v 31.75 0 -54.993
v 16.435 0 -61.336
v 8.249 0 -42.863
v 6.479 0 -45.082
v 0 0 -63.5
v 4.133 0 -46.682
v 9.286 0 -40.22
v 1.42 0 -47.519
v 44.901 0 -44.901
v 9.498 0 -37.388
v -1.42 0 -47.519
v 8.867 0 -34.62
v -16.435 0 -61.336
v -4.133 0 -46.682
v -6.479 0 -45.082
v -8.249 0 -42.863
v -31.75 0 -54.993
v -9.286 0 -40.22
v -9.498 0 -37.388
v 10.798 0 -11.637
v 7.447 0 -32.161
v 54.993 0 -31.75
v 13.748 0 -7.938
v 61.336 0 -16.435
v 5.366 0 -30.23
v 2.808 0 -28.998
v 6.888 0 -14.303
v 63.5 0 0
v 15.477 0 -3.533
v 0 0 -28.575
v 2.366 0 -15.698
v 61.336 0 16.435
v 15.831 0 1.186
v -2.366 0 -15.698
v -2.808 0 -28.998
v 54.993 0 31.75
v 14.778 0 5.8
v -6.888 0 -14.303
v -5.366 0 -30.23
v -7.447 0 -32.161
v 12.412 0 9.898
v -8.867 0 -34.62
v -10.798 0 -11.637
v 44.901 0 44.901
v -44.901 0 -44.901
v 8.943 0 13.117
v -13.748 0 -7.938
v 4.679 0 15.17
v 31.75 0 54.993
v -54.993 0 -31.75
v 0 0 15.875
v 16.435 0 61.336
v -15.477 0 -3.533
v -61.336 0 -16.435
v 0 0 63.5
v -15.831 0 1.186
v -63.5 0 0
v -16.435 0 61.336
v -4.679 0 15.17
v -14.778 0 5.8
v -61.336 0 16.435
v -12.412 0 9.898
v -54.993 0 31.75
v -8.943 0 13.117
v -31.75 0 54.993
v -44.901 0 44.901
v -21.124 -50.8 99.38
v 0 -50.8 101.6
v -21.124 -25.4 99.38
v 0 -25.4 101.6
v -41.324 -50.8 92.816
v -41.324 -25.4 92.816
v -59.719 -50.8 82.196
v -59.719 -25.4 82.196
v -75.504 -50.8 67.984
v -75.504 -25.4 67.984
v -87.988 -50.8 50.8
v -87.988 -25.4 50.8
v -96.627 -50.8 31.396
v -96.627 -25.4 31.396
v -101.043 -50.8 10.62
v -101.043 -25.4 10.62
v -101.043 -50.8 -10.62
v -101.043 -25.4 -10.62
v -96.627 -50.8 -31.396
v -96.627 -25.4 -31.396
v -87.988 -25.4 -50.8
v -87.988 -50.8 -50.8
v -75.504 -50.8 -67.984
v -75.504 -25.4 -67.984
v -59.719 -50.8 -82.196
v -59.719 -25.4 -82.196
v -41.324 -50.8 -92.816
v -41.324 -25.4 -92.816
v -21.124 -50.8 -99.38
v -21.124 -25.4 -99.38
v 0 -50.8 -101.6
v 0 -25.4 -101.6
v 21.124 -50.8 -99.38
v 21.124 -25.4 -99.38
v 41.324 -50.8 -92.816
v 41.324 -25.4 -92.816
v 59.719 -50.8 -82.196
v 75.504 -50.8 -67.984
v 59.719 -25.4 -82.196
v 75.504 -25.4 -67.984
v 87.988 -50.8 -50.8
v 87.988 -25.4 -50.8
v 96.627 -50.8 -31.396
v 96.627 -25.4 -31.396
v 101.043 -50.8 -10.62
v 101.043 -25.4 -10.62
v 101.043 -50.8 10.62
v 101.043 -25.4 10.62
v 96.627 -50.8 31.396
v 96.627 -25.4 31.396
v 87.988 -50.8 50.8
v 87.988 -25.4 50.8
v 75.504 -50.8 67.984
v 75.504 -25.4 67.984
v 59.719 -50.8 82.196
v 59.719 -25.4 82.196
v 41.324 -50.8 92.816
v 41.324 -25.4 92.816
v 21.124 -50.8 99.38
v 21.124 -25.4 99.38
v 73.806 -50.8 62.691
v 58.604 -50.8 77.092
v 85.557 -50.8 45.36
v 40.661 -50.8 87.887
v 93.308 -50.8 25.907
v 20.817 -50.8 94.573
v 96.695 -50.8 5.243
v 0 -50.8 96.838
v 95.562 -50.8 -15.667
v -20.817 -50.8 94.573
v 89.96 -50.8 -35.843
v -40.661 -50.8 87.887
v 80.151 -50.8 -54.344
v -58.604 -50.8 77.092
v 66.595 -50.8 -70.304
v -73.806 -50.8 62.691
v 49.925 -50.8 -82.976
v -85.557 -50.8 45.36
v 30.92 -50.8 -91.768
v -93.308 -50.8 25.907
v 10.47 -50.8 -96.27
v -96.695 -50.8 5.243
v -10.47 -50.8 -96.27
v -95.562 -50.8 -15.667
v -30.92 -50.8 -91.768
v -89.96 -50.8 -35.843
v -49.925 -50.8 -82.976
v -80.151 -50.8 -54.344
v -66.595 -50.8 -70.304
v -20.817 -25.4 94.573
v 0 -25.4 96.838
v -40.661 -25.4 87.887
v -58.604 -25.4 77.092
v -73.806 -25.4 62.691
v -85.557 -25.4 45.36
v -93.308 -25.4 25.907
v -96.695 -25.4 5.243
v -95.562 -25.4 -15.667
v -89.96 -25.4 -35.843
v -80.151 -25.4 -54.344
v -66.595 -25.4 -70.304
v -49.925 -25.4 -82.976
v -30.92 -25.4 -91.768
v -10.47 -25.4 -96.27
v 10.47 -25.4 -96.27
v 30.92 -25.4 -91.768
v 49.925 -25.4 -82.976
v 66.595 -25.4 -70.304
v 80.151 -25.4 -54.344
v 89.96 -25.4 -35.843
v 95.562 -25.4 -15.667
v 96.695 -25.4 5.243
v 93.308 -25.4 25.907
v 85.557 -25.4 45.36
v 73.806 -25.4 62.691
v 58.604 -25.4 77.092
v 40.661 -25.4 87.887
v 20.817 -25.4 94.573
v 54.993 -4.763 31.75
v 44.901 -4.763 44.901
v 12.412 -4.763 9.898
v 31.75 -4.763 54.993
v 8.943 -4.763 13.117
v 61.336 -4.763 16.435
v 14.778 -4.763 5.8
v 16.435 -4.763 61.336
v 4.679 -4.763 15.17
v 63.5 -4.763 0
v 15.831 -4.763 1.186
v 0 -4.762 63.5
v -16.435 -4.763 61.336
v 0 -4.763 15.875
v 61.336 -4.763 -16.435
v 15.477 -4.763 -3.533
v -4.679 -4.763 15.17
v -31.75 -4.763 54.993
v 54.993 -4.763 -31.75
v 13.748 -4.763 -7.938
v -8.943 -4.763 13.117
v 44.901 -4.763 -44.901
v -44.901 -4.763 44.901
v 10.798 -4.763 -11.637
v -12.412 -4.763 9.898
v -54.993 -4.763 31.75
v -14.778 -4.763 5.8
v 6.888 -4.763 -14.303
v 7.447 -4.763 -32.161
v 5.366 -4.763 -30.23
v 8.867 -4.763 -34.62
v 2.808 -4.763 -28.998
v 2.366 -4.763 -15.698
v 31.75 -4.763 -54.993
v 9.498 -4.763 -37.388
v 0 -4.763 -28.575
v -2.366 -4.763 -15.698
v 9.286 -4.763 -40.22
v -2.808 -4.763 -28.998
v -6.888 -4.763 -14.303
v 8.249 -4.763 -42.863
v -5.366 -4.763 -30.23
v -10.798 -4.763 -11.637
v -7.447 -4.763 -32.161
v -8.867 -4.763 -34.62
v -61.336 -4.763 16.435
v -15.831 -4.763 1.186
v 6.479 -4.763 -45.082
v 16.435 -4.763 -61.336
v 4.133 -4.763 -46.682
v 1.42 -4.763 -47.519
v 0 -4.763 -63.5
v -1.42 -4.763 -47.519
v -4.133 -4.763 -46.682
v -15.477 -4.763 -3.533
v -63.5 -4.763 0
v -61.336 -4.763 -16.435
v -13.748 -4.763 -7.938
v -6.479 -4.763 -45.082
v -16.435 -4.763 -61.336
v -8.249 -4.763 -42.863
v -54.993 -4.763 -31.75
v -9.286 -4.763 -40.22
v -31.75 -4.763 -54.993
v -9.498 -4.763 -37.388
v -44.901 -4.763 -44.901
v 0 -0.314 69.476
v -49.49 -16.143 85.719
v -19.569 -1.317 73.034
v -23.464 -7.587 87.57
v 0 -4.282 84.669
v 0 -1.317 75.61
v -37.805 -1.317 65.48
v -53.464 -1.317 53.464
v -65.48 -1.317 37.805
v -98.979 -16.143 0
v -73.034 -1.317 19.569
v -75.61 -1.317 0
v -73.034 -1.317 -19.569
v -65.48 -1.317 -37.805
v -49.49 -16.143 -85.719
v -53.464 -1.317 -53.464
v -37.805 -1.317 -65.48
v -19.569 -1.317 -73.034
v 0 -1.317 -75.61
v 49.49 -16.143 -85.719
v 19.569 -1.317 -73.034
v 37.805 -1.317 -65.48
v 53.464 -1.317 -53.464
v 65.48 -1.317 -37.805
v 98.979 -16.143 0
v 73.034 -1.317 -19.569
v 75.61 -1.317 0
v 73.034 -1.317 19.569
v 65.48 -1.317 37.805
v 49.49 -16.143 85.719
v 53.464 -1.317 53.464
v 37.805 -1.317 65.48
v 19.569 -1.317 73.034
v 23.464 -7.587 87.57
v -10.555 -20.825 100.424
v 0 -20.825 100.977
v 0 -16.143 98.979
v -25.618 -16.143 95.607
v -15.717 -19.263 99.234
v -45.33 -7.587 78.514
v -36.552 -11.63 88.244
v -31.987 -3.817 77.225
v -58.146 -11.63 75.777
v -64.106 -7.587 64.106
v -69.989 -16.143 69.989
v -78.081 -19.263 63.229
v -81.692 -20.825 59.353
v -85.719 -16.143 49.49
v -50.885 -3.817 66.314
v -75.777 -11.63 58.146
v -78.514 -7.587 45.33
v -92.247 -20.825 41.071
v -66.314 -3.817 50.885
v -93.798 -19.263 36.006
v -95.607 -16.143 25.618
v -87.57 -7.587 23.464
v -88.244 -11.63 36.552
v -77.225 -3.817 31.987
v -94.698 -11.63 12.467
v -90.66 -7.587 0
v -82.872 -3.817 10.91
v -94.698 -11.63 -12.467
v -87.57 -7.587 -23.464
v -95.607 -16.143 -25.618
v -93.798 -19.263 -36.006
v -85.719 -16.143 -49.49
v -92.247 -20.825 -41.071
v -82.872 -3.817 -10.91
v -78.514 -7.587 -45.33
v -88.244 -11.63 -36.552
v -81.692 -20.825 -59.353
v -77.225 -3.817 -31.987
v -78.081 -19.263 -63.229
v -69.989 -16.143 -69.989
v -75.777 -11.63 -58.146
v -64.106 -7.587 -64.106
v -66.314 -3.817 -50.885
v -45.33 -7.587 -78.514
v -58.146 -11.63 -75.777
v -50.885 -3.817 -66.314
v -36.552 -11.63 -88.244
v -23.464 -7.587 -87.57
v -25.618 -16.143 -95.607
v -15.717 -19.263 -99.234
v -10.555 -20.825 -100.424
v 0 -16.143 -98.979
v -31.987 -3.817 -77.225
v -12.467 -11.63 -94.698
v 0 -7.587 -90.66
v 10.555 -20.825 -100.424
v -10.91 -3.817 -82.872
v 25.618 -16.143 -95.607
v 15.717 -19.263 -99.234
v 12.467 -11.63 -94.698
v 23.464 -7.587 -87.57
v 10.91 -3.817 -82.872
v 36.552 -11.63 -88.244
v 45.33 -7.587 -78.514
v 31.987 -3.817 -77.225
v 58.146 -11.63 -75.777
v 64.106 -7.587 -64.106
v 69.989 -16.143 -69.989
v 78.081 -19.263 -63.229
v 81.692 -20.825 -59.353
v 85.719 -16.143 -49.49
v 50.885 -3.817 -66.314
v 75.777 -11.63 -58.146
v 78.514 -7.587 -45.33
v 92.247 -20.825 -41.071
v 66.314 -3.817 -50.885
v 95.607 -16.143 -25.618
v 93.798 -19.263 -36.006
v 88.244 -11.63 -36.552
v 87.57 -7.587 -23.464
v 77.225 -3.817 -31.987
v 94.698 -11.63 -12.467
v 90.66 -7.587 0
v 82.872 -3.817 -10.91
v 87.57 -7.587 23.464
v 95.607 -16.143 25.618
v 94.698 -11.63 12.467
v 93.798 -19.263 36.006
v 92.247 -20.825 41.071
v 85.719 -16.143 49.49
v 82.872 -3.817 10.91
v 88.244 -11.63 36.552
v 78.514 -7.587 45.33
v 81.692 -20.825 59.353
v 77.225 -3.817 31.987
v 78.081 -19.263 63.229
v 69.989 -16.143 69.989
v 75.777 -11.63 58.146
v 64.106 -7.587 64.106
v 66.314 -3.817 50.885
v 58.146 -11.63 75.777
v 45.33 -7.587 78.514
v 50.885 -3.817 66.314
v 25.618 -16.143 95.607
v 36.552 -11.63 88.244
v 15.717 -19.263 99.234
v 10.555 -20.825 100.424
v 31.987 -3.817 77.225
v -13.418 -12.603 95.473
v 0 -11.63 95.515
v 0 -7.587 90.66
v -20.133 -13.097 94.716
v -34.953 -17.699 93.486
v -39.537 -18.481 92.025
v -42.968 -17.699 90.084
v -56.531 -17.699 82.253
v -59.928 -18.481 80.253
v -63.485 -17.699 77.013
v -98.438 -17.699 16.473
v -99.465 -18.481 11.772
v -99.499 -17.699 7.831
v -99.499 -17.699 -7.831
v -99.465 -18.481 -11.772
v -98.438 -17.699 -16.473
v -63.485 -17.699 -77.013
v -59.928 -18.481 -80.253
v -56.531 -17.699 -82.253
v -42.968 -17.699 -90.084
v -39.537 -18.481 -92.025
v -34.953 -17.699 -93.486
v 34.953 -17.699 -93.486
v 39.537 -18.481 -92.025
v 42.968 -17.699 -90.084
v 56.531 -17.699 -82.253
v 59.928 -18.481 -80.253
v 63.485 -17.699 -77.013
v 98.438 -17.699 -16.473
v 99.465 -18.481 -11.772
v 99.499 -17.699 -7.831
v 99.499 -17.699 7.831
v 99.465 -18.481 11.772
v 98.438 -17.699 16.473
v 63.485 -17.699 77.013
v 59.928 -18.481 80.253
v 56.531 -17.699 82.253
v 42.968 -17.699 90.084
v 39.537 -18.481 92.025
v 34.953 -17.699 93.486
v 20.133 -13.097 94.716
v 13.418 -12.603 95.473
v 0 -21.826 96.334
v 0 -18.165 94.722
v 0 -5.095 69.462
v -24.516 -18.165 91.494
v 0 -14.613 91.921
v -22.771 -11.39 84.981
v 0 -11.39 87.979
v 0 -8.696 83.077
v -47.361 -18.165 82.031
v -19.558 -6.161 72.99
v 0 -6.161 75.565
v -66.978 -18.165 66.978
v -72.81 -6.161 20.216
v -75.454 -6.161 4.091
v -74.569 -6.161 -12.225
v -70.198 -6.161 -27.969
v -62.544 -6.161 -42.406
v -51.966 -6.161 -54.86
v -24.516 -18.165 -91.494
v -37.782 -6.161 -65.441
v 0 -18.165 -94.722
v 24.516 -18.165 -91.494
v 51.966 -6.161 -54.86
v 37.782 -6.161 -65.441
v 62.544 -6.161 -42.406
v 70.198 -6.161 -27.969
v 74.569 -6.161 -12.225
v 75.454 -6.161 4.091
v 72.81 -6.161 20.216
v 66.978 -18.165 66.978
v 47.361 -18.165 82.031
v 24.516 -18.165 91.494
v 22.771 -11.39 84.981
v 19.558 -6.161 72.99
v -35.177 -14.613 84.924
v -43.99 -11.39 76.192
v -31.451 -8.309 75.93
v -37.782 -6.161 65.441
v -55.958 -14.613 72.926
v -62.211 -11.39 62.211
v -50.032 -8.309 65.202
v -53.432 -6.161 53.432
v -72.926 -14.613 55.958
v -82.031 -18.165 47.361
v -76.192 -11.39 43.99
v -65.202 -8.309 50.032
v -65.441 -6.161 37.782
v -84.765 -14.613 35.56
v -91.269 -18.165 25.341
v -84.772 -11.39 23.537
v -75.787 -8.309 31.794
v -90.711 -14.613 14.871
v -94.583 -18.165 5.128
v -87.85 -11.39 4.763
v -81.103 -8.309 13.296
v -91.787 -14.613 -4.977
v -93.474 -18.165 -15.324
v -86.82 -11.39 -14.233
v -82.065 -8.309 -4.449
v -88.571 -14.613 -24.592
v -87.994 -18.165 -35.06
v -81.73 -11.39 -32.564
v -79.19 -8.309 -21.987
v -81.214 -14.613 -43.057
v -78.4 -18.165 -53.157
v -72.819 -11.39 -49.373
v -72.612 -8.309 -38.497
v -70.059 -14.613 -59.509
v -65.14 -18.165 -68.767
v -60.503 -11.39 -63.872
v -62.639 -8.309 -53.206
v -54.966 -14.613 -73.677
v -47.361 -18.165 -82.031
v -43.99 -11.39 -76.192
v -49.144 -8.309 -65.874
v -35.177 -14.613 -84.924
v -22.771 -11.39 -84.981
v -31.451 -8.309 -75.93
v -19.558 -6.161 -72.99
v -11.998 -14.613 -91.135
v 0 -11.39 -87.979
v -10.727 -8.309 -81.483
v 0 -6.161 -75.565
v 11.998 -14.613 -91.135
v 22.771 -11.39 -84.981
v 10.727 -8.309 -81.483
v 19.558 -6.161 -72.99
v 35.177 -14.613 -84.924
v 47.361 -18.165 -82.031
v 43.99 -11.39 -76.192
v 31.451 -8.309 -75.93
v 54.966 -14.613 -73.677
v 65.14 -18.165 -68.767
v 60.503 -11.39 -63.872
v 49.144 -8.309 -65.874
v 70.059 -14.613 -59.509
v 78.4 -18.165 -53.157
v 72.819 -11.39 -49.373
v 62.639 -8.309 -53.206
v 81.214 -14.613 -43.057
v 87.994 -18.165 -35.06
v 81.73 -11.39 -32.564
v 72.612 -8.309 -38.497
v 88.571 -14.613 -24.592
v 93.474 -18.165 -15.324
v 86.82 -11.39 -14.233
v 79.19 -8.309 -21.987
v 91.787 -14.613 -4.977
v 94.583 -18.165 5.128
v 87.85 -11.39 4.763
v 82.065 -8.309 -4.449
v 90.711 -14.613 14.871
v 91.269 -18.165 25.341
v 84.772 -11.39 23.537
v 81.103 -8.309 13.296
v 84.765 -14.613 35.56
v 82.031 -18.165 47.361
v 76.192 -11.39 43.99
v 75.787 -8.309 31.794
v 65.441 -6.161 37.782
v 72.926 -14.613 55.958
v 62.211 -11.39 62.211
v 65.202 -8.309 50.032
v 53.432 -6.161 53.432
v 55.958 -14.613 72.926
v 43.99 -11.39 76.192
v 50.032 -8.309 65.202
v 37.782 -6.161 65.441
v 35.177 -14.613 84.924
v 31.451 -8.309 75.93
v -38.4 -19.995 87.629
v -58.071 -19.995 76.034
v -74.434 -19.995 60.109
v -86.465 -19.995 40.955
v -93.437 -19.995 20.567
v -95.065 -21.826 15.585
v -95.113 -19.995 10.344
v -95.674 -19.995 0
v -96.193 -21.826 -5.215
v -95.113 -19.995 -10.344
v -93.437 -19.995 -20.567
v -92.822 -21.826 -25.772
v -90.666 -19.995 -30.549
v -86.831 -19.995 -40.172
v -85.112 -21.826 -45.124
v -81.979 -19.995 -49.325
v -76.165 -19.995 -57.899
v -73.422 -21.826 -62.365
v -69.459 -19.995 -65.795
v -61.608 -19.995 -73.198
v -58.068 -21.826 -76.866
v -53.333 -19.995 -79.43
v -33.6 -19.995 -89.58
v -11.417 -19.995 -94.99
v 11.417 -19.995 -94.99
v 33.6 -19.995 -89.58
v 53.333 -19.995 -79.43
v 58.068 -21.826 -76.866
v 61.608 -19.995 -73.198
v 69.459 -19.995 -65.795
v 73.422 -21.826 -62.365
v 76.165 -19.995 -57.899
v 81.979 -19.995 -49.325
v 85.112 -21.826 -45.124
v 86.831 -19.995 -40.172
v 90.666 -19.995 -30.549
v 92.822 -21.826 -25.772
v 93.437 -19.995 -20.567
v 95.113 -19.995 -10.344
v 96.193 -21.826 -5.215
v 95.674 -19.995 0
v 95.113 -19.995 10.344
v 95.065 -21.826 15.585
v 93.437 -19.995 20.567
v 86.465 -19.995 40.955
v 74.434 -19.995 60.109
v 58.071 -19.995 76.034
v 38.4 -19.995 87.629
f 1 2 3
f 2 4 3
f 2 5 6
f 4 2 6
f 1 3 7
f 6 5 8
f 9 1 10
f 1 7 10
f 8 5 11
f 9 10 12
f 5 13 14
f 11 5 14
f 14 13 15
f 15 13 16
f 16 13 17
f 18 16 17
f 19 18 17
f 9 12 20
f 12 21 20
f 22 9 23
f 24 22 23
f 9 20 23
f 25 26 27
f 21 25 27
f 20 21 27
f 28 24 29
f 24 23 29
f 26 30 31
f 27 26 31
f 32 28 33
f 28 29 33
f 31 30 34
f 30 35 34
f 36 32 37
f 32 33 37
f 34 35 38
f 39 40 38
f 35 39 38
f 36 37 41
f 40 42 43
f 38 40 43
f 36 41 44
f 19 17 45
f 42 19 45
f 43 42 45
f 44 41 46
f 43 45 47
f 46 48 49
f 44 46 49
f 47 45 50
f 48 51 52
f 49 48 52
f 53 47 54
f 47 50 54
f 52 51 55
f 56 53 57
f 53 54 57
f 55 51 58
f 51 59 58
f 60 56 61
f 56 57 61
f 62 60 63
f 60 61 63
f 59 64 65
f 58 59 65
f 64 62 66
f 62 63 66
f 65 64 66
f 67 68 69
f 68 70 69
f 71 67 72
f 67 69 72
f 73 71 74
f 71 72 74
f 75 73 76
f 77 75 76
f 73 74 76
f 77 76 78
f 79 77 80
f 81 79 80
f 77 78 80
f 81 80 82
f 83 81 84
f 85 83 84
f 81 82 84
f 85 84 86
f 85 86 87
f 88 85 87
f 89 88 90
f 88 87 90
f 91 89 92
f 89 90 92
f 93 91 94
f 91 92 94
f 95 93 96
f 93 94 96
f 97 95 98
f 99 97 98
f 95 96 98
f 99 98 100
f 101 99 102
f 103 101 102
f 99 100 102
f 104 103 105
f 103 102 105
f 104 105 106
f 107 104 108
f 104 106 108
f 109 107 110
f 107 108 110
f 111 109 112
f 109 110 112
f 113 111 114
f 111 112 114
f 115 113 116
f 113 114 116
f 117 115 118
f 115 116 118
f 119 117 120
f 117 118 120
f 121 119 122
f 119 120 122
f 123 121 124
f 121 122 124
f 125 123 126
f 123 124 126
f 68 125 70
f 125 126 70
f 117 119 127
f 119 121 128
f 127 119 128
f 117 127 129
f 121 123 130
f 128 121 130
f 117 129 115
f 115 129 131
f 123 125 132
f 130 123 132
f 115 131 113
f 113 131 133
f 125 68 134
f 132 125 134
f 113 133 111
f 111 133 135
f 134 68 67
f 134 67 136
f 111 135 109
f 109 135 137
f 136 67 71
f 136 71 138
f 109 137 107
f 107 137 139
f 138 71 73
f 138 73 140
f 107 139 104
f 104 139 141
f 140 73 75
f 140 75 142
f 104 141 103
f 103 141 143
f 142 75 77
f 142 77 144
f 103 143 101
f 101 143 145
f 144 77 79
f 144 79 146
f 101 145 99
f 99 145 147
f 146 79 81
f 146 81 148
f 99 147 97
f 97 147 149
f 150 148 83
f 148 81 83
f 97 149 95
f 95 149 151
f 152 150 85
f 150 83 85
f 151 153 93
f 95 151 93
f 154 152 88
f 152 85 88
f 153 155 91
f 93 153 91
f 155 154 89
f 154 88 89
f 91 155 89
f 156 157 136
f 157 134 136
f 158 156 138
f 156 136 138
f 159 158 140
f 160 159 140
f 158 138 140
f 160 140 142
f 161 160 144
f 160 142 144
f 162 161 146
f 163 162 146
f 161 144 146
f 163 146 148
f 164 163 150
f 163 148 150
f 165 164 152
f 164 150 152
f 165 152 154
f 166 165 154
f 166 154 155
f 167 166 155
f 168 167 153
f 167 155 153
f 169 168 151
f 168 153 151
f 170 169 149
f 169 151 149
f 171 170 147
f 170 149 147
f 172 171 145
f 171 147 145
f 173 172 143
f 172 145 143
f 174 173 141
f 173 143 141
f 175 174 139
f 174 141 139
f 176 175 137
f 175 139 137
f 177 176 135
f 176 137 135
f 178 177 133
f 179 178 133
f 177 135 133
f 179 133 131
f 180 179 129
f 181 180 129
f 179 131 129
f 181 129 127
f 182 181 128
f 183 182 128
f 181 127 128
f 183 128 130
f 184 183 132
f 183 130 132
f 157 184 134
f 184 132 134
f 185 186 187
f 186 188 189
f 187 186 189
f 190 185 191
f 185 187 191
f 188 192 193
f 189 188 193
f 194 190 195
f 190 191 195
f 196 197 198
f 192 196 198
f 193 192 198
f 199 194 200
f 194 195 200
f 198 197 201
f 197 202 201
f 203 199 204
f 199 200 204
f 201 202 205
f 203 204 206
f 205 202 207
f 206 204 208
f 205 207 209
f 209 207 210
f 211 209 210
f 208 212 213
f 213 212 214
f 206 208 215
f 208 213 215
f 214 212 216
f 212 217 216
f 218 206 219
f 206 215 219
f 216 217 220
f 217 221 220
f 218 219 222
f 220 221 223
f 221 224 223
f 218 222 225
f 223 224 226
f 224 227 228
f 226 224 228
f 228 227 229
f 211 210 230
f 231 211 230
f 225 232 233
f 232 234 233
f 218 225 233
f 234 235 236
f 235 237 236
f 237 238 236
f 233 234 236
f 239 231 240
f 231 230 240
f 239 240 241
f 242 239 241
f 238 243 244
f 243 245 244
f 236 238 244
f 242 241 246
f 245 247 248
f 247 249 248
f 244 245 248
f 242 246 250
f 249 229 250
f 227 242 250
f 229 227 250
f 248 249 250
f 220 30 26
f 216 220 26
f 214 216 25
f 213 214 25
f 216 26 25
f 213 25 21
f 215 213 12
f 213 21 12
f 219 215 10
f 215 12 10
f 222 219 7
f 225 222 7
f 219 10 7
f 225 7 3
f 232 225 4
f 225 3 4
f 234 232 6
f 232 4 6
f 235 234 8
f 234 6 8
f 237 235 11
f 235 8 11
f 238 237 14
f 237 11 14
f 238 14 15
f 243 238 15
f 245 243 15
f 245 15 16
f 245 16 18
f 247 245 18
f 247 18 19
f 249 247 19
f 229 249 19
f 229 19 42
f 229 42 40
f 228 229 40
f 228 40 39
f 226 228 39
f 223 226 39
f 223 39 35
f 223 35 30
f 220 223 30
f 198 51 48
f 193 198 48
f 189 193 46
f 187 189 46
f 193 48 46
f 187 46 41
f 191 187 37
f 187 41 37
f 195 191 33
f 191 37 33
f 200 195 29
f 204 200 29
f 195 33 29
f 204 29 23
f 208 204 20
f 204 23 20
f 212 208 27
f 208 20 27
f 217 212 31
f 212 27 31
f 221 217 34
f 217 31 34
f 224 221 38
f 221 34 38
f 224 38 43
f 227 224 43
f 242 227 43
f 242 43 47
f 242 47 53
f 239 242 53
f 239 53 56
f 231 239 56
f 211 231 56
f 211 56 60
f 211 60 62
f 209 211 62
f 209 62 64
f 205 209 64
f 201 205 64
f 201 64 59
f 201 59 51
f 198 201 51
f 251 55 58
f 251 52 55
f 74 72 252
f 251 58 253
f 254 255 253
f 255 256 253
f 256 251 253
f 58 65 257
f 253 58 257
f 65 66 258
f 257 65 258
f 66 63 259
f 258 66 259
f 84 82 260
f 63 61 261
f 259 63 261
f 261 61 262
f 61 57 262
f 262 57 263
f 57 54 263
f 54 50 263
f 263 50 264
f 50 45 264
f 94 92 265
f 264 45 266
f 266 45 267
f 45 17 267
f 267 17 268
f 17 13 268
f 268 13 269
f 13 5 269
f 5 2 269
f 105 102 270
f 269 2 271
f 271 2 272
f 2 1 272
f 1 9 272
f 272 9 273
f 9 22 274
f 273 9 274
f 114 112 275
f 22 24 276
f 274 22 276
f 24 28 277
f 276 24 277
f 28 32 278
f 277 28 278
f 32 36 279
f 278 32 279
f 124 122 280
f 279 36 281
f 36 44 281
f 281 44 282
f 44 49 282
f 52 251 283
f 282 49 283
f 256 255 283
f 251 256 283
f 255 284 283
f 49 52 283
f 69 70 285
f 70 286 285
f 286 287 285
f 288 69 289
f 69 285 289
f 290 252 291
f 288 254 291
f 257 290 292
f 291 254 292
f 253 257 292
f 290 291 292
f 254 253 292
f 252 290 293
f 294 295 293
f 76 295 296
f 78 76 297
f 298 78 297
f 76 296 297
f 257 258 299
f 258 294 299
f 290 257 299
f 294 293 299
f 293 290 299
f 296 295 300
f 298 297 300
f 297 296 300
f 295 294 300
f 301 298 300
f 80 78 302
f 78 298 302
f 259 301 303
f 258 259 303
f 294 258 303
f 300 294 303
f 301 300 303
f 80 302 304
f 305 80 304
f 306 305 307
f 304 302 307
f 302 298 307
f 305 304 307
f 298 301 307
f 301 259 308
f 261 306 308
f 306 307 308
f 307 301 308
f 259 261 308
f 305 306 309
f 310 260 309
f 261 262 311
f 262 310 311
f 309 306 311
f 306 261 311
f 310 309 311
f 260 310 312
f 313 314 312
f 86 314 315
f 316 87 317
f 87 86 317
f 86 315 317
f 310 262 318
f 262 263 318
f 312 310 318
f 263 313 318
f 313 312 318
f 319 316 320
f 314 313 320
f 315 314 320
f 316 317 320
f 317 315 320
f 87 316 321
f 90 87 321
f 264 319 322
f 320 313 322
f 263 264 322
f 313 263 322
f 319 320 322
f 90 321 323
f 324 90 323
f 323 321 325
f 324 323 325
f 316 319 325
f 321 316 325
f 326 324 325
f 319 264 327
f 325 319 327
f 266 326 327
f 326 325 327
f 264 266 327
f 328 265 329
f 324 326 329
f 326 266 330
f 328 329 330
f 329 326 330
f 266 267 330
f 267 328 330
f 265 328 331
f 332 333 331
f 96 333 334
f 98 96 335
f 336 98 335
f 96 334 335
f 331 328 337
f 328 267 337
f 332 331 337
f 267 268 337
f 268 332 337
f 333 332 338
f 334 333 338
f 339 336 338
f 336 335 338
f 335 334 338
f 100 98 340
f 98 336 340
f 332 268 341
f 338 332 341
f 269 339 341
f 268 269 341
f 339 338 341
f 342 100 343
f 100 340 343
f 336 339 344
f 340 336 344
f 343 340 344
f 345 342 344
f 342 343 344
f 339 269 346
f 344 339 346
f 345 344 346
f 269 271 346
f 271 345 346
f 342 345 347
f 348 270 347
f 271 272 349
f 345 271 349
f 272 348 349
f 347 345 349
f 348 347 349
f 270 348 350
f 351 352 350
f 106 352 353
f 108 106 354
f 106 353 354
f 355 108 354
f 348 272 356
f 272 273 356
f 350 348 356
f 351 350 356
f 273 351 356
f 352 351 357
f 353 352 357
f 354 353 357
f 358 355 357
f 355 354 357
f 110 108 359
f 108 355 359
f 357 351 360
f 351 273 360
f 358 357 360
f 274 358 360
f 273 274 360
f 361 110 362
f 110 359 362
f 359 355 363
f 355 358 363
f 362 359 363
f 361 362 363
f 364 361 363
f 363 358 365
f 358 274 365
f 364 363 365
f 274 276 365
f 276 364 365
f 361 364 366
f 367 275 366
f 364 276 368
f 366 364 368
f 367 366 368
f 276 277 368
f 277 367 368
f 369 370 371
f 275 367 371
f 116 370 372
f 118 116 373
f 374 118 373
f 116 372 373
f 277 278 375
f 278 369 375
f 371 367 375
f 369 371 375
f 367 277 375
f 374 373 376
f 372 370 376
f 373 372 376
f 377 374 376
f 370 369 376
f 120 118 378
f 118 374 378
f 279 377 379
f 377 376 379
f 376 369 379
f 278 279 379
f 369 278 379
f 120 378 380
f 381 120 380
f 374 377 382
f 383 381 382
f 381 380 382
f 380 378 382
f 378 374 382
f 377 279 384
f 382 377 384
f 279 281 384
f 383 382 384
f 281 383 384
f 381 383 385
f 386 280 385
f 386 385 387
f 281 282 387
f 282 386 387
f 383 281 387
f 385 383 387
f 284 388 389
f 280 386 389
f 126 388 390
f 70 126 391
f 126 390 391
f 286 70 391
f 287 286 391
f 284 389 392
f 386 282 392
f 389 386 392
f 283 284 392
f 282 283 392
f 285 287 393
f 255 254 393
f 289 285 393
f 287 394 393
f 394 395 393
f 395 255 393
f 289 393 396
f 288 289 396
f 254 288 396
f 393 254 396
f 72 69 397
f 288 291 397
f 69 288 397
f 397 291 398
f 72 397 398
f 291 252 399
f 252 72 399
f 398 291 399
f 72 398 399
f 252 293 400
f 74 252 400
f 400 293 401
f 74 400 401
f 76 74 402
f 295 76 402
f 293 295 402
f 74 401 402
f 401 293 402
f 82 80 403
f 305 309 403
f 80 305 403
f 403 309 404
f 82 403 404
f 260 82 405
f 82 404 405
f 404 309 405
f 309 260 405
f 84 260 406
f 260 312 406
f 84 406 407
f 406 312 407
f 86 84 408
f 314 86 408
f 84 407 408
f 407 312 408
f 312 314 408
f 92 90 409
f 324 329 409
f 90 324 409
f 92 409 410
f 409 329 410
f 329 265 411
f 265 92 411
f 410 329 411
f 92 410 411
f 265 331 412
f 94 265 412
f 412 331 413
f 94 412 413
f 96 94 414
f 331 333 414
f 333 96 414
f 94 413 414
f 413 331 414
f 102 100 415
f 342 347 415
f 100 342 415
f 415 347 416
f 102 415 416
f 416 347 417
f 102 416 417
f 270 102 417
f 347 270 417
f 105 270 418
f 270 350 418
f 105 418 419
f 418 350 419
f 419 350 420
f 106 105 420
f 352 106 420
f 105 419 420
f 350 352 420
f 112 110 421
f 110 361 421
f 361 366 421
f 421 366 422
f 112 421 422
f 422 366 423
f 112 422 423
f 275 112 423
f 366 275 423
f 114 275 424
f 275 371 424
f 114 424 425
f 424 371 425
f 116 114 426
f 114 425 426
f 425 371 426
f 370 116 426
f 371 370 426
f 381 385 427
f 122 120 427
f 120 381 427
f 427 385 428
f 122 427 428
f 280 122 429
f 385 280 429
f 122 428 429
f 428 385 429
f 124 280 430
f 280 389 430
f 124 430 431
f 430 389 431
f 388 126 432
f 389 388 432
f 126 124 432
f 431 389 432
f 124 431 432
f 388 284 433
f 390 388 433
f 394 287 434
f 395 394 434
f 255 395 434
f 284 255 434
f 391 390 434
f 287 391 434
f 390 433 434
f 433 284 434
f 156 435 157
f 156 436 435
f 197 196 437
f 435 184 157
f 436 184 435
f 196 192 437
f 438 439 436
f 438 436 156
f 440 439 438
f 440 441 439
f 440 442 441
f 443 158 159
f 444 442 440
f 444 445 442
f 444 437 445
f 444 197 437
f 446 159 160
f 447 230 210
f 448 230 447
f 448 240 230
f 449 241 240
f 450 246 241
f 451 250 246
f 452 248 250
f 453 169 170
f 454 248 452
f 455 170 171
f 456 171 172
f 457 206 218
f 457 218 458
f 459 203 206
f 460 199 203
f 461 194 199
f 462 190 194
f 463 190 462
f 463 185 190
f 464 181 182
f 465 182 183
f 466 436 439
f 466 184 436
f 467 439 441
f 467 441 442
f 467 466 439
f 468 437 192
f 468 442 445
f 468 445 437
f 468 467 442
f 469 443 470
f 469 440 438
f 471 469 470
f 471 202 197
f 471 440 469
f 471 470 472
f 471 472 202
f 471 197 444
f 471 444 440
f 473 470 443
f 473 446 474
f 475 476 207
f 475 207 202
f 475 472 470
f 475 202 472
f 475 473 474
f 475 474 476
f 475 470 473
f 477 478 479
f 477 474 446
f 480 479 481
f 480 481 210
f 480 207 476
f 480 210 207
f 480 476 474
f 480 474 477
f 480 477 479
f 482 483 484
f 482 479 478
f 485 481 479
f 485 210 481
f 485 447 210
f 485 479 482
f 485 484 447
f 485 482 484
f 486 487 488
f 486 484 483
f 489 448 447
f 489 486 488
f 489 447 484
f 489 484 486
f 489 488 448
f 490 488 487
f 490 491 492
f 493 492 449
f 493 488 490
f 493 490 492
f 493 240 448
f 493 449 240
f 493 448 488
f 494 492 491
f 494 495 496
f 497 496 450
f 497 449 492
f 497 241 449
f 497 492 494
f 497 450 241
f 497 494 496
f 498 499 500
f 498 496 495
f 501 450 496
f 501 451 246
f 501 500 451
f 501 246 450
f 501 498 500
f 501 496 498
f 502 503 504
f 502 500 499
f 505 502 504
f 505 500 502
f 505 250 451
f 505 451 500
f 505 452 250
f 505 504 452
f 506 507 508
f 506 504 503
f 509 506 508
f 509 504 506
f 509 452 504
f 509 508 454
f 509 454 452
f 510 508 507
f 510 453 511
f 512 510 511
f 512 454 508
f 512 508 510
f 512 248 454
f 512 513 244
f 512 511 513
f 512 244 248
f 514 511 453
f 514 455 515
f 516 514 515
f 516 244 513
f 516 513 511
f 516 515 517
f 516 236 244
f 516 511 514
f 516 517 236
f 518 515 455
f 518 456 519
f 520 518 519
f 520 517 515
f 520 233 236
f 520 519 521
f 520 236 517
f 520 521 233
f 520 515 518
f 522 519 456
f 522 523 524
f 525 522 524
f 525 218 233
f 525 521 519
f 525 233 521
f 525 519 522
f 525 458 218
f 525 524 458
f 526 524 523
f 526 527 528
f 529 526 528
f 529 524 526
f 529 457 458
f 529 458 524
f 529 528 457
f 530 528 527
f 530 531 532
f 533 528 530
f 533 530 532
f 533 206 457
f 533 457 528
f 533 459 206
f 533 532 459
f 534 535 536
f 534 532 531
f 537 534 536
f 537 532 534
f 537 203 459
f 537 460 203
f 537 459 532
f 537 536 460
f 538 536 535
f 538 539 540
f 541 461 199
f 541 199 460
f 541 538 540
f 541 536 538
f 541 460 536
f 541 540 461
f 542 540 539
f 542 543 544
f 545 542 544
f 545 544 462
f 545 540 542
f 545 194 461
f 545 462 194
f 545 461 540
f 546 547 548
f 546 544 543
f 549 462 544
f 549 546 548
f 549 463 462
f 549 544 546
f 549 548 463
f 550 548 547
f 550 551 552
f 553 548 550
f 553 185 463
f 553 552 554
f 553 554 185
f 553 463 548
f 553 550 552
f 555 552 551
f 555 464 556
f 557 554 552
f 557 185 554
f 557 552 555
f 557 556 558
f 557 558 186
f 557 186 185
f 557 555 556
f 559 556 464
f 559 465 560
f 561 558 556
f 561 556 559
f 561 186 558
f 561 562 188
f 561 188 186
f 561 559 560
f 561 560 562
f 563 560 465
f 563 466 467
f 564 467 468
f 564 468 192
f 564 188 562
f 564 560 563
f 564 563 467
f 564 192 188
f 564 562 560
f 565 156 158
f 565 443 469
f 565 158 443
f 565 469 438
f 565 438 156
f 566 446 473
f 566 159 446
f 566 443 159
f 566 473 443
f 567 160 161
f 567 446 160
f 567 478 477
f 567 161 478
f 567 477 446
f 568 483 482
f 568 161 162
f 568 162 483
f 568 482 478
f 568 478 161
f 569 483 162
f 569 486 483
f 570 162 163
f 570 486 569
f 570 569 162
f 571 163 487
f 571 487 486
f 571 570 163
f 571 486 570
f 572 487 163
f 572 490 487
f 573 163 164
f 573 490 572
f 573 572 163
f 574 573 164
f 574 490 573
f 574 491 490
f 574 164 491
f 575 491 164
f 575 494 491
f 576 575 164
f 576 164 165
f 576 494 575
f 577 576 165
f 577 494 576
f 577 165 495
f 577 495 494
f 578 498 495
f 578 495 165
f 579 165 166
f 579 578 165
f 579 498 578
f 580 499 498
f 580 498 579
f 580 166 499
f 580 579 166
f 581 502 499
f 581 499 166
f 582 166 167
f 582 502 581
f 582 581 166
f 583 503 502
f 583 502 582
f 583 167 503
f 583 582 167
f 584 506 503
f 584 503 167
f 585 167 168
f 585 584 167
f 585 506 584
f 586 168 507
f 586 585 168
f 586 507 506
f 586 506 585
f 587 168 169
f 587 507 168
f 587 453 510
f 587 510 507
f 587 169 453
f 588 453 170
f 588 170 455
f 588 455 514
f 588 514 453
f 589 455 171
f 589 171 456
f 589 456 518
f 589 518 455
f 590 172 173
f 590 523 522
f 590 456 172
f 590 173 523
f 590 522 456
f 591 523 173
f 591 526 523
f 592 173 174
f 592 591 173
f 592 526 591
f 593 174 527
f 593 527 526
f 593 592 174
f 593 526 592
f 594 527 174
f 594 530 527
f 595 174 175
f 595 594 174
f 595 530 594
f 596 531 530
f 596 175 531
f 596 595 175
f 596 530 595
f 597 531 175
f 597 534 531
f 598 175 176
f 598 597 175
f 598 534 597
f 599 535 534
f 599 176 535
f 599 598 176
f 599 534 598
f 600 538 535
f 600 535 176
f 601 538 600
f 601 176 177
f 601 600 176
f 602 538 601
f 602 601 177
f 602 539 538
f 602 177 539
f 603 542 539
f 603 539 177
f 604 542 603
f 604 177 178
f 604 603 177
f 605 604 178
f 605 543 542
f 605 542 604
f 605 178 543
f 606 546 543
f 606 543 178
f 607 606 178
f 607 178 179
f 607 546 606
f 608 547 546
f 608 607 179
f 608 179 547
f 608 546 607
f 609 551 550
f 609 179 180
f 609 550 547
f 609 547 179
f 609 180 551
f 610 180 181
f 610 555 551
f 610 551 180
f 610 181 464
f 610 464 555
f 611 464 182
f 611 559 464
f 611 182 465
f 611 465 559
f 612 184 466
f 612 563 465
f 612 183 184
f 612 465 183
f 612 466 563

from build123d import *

# Parameters (mm, degrees)
SKETCH2_R          = 9.525
SKETCH2_R_2        = 15.875
CUT_EXTRUDE1_DEPTH = 25.4


with BuildPart() as part:
    # Sketch1 → Revolve1 (revolve)
    with BuildSketch(Plane.XY, mode=Mode.PRIVATE) as revolve1_sk:
        with BuildLine():
            Line((0, 0), (0, -4.7625))
            Line((0, -4.7625), (63.5, -4.7625))
            add(Edge.make_bspline(
                [(96.8375, -25.4), (96.8375, -4.7625), (63.5, -4.7625)],
                knots=[0, 0, 0, 1.570796327, 1.570796327, 1.570796327], degree=2, weights=[1, 0.707106781, 1]))
            Line((96.8375, -25.4), (96.8375, -50.8))
            Line((96.8375, -50.8), (101.6, -50.8))
            Line((101.6, -50.8), (101.6, -25.4))
            add(Edge.make_bspline(
                [(101.6, -25.4), (101.6, 0), (63.5, 0)],
                knots=[3.141592654, 3.141592654, 3.141592654, 4.71238898, 4.71238898, 4.71238898], degree=2, weights=[1, 0.707106781, 1]))
            Line((63.5, 0), (0, 0))
        make_face()
    revolve(revolve1_sk.sketch.rotate(Axis((0, 29.511089747, 0), (0, -1, 0)), 90), axis=Axis((0, 29.511089747, 0), (0, -1, 0)))

    # Sketch2 → Cut-Extrude1 (cut)
    with BuildSketch(Plane(origin=(0, 0, 0), x_dir=(1, 0, 0), z_dir=(0, 1, 0))):
        with Locations(Location((0, 38.1, 0), (0, 0, 270))):
            Circle(SKETCH2_R)
        with Locations(Location((0, 0, 0), (0, 0, 270))):
            Circle(SKETCH2_R_2)
    extrude(amount=-CUT_EXTRUDE1_DEPTH, mode=Mode.SUBTRACT)


solid = part.part
